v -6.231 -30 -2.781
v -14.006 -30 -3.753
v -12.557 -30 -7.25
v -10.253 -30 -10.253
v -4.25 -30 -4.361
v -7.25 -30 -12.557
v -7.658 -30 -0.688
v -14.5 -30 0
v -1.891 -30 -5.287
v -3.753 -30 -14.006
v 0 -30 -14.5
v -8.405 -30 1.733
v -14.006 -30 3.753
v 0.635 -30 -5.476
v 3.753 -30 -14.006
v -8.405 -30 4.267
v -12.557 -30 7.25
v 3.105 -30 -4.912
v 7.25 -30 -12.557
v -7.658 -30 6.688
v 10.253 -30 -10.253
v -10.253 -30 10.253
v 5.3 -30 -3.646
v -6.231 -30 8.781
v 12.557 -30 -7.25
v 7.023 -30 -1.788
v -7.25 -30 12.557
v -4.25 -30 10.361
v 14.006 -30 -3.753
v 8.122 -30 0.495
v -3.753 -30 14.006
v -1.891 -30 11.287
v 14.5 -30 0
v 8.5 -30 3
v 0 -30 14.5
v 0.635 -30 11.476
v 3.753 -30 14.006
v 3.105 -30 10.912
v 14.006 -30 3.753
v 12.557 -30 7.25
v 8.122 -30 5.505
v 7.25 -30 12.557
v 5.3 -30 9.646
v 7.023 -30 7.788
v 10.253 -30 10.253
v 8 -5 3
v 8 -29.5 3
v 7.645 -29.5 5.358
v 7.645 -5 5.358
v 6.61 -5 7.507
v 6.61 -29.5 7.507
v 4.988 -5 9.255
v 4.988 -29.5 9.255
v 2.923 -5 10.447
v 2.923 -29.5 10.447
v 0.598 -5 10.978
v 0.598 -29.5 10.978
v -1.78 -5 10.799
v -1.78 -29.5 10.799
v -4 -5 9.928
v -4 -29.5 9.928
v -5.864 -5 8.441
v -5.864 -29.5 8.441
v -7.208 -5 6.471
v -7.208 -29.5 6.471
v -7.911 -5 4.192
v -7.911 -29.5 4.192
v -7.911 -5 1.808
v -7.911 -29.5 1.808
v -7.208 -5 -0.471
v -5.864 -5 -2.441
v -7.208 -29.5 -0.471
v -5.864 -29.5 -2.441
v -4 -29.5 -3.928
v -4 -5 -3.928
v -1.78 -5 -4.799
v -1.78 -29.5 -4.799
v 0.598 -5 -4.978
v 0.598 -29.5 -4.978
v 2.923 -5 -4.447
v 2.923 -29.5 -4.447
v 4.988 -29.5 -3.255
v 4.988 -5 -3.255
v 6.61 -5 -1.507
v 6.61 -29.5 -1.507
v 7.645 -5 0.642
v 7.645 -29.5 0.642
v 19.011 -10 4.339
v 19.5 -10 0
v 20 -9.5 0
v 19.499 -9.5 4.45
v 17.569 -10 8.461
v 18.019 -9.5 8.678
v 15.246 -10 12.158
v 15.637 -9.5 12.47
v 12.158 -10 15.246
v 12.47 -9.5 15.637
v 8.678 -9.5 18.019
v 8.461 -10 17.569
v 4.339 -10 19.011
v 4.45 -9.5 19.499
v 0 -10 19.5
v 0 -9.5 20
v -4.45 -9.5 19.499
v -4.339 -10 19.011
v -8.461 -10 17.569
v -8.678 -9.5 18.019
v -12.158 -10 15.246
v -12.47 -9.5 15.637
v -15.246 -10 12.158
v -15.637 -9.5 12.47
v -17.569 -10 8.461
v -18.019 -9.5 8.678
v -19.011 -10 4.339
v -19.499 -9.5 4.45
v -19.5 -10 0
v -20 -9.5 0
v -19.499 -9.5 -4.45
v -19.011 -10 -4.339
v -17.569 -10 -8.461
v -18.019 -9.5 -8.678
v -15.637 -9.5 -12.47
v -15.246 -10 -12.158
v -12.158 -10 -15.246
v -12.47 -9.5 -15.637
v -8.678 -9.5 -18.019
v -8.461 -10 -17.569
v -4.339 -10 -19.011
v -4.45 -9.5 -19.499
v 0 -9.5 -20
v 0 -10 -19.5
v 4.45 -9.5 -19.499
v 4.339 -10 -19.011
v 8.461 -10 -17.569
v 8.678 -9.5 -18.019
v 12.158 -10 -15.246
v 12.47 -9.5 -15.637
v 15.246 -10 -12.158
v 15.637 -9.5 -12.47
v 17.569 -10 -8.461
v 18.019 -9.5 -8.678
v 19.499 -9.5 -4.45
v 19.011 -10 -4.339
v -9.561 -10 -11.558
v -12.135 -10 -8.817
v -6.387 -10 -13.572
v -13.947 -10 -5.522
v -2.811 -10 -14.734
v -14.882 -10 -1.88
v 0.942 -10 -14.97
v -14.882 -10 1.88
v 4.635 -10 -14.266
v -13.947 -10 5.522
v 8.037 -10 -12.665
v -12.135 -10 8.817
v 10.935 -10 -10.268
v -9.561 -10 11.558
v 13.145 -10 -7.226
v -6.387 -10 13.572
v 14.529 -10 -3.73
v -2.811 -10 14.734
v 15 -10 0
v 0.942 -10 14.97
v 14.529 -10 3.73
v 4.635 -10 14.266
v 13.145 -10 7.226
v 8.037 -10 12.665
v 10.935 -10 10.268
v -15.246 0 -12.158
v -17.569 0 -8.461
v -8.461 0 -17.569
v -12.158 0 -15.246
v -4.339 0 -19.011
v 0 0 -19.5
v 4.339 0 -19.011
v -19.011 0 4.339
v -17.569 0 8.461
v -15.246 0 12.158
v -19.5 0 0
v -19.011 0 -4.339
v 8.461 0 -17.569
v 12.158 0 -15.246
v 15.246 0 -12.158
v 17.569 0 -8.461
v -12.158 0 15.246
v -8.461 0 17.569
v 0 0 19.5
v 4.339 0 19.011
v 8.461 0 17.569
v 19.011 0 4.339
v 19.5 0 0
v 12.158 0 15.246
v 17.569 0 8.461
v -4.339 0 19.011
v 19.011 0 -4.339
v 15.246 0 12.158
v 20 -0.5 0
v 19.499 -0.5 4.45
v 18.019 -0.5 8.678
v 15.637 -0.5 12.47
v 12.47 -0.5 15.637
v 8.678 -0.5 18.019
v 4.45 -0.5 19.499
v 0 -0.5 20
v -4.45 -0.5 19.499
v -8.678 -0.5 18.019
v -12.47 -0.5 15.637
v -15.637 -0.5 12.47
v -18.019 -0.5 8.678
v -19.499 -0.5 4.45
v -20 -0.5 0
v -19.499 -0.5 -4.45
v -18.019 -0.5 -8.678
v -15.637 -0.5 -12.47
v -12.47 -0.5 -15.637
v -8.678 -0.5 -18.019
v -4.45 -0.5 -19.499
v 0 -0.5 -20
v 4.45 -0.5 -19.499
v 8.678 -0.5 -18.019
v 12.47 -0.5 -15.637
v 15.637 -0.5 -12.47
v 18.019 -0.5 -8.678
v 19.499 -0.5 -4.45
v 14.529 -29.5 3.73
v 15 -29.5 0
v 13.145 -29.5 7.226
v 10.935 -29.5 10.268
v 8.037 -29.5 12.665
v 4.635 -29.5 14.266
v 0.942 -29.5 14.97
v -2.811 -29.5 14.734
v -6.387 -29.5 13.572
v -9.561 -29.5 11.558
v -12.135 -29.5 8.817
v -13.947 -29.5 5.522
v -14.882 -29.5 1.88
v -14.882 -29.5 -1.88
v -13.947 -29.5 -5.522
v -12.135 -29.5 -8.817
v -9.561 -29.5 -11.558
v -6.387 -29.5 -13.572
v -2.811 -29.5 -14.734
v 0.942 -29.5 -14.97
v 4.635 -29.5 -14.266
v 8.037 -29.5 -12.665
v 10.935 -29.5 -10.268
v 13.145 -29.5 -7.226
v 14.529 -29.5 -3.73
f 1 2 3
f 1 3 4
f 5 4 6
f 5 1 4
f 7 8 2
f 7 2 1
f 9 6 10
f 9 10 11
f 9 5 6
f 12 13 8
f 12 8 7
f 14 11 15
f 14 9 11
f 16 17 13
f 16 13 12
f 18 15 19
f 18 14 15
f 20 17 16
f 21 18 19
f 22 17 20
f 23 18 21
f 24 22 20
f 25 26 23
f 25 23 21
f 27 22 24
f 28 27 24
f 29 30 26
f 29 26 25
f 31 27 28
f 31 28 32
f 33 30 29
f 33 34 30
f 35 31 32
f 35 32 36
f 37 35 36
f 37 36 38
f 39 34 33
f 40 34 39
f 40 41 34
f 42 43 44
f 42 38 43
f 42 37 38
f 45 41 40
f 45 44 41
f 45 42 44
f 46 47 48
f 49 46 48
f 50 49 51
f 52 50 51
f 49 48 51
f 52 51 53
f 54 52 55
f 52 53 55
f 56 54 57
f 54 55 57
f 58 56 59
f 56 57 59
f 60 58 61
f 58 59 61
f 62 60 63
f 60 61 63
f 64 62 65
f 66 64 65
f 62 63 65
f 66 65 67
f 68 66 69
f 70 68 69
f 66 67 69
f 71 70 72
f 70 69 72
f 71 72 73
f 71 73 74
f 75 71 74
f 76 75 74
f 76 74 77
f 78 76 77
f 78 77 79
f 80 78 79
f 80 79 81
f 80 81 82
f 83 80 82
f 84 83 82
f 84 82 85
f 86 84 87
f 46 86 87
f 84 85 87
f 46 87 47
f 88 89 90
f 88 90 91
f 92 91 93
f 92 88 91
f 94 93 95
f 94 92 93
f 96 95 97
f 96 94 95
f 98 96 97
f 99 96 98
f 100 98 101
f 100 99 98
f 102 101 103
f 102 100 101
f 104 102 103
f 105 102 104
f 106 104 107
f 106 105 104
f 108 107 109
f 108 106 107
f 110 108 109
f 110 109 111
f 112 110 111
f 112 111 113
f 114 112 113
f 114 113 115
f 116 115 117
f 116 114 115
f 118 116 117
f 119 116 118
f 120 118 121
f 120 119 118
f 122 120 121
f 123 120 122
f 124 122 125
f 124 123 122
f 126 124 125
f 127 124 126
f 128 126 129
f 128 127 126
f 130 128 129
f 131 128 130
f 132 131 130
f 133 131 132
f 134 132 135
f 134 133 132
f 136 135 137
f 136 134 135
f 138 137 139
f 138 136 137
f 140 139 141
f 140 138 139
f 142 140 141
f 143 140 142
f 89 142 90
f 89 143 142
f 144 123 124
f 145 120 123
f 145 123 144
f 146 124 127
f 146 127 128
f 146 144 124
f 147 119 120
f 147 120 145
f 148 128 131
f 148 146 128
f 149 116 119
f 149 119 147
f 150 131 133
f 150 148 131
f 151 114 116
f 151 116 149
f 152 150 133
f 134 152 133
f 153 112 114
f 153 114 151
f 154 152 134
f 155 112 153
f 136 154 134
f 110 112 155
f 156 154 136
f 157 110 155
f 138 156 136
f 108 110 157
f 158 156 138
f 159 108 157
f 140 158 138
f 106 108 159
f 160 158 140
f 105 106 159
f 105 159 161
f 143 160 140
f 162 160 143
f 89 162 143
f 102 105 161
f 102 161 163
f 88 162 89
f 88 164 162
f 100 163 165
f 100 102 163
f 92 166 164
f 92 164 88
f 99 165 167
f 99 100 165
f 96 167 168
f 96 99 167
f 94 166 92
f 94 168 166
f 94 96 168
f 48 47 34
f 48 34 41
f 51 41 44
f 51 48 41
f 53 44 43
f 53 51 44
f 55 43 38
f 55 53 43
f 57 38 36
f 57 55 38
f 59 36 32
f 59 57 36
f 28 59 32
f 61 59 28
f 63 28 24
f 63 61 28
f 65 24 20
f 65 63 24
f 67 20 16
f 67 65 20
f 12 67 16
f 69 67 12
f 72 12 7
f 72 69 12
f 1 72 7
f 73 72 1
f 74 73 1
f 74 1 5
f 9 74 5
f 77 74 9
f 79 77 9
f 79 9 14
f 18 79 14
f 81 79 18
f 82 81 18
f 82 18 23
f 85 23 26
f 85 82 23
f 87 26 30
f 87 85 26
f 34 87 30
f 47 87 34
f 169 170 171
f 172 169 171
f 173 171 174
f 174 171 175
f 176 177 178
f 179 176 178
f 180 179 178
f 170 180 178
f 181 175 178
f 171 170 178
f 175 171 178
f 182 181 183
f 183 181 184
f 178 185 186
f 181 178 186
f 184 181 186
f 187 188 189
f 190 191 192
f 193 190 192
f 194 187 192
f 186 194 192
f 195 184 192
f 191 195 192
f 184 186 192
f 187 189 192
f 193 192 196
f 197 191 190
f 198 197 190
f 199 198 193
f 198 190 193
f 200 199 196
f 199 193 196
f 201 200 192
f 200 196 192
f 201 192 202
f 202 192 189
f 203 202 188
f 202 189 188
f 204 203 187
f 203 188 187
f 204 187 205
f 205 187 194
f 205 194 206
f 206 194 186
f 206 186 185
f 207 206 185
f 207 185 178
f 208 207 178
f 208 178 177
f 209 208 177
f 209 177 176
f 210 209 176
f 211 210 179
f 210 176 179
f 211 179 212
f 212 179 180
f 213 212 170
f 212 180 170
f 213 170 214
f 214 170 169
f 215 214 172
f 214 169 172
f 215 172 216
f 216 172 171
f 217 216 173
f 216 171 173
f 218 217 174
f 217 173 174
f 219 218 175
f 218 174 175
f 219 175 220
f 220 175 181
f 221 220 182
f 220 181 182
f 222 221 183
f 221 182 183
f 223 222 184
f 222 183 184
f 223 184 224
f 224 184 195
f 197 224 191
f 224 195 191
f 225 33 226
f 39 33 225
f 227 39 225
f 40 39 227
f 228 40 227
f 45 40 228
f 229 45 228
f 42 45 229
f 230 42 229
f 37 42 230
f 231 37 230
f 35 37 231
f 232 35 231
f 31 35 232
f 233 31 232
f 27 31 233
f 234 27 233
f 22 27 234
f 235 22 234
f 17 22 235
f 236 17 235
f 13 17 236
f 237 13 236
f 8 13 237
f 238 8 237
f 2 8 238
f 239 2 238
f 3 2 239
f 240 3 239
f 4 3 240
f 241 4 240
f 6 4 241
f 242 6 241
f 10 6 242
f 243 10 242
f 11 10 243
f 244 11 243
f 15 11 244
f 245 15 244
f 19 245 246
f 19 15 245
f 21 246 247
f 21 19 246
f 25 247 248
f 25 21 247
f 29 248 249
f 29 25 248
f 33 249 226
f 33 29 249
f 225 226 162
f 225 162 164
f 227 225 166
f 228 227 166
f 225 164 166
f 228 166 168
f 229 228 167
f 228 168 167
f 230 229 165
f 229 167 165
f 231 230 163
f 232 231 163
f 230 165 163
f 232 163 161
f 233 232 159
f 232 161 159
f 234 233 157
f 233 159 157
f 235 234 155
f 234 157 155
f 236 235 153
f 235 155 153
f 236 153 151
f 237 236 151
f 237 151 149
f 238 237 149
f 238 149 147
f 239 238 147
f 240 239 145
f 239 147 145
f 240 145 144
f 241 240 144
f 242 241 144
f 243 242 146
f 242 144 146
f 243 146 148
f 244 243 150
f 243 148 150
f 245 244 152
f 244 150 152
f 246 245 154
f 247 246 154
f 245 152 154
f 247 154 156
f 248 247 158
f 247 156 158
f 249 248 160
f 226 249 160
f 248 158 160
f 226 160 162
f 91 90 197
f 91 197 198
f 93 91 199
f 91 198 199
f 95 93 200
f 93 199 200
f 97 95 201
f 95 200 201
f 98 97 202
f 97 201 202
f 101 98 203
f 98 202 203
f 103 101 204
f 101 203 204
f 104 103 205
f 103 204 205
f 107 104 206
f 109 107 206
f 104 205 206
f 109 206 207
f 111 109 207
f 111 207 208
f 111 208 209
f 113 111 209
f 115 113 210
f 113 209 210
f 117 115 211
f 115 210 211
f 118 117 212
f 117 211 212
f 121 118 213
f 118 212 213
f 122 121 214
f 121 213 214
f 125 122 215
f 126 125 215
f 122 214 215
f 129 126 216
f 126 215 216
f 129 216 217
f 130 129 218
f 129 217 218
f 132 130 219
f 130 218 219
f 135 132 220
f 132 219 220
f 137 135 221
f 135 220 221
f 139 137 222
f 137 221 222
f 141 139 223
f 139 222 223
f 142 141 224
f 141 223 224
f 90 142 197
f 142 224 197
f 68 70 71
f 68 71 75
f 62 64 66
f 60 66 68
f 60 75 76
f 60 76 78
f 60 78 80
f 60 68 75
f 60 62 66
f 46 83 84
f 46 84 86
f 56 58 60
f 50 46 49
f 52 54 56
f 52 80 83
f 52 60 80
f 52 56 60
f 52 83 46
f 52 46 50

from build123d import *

# Parameters (mm, degrees)
F0_R     = 20
F1_DEPTH = 10
F2_R     = 15
F3_DEPTH = 20
F4_R     = 8
F5_DEPTH = 25
F6_SIZE  = 0.5


with BuildPart() as f1:
    # F0 (on Front) → F1 (new body)
    with BuildSketch(Plane.XZ):
        Circle(F0_R)
    extrude(amount=F1_DEPTH)

    # F2 (on face) → F3 (join)
    with BuildSketch(Plane.XZ.offset(10)):
        Circle(F2_R)
    extrude(amount=F3_DEPTH)

    # F4 (on face) → F5 (cut)
    with BuildSketch(Plane.XZ.offset(30)):
        with Locations((0, 3)):
            Circle(F4_R)
    extrude(amount=-F5_DEPTH, mode=Mode.SUBTRACT)

    # F6
    f6_edges = [f1.edges().sort_by_distance(p)[0] for p in [
        (-15, -30, 0),
        (-20, -10, 0),
        (-20, 0, 0),
        (-8, -30, 3),
    ]]
    chamfer(f6_edges, length=F6_SIZE)


solid = f1.part
